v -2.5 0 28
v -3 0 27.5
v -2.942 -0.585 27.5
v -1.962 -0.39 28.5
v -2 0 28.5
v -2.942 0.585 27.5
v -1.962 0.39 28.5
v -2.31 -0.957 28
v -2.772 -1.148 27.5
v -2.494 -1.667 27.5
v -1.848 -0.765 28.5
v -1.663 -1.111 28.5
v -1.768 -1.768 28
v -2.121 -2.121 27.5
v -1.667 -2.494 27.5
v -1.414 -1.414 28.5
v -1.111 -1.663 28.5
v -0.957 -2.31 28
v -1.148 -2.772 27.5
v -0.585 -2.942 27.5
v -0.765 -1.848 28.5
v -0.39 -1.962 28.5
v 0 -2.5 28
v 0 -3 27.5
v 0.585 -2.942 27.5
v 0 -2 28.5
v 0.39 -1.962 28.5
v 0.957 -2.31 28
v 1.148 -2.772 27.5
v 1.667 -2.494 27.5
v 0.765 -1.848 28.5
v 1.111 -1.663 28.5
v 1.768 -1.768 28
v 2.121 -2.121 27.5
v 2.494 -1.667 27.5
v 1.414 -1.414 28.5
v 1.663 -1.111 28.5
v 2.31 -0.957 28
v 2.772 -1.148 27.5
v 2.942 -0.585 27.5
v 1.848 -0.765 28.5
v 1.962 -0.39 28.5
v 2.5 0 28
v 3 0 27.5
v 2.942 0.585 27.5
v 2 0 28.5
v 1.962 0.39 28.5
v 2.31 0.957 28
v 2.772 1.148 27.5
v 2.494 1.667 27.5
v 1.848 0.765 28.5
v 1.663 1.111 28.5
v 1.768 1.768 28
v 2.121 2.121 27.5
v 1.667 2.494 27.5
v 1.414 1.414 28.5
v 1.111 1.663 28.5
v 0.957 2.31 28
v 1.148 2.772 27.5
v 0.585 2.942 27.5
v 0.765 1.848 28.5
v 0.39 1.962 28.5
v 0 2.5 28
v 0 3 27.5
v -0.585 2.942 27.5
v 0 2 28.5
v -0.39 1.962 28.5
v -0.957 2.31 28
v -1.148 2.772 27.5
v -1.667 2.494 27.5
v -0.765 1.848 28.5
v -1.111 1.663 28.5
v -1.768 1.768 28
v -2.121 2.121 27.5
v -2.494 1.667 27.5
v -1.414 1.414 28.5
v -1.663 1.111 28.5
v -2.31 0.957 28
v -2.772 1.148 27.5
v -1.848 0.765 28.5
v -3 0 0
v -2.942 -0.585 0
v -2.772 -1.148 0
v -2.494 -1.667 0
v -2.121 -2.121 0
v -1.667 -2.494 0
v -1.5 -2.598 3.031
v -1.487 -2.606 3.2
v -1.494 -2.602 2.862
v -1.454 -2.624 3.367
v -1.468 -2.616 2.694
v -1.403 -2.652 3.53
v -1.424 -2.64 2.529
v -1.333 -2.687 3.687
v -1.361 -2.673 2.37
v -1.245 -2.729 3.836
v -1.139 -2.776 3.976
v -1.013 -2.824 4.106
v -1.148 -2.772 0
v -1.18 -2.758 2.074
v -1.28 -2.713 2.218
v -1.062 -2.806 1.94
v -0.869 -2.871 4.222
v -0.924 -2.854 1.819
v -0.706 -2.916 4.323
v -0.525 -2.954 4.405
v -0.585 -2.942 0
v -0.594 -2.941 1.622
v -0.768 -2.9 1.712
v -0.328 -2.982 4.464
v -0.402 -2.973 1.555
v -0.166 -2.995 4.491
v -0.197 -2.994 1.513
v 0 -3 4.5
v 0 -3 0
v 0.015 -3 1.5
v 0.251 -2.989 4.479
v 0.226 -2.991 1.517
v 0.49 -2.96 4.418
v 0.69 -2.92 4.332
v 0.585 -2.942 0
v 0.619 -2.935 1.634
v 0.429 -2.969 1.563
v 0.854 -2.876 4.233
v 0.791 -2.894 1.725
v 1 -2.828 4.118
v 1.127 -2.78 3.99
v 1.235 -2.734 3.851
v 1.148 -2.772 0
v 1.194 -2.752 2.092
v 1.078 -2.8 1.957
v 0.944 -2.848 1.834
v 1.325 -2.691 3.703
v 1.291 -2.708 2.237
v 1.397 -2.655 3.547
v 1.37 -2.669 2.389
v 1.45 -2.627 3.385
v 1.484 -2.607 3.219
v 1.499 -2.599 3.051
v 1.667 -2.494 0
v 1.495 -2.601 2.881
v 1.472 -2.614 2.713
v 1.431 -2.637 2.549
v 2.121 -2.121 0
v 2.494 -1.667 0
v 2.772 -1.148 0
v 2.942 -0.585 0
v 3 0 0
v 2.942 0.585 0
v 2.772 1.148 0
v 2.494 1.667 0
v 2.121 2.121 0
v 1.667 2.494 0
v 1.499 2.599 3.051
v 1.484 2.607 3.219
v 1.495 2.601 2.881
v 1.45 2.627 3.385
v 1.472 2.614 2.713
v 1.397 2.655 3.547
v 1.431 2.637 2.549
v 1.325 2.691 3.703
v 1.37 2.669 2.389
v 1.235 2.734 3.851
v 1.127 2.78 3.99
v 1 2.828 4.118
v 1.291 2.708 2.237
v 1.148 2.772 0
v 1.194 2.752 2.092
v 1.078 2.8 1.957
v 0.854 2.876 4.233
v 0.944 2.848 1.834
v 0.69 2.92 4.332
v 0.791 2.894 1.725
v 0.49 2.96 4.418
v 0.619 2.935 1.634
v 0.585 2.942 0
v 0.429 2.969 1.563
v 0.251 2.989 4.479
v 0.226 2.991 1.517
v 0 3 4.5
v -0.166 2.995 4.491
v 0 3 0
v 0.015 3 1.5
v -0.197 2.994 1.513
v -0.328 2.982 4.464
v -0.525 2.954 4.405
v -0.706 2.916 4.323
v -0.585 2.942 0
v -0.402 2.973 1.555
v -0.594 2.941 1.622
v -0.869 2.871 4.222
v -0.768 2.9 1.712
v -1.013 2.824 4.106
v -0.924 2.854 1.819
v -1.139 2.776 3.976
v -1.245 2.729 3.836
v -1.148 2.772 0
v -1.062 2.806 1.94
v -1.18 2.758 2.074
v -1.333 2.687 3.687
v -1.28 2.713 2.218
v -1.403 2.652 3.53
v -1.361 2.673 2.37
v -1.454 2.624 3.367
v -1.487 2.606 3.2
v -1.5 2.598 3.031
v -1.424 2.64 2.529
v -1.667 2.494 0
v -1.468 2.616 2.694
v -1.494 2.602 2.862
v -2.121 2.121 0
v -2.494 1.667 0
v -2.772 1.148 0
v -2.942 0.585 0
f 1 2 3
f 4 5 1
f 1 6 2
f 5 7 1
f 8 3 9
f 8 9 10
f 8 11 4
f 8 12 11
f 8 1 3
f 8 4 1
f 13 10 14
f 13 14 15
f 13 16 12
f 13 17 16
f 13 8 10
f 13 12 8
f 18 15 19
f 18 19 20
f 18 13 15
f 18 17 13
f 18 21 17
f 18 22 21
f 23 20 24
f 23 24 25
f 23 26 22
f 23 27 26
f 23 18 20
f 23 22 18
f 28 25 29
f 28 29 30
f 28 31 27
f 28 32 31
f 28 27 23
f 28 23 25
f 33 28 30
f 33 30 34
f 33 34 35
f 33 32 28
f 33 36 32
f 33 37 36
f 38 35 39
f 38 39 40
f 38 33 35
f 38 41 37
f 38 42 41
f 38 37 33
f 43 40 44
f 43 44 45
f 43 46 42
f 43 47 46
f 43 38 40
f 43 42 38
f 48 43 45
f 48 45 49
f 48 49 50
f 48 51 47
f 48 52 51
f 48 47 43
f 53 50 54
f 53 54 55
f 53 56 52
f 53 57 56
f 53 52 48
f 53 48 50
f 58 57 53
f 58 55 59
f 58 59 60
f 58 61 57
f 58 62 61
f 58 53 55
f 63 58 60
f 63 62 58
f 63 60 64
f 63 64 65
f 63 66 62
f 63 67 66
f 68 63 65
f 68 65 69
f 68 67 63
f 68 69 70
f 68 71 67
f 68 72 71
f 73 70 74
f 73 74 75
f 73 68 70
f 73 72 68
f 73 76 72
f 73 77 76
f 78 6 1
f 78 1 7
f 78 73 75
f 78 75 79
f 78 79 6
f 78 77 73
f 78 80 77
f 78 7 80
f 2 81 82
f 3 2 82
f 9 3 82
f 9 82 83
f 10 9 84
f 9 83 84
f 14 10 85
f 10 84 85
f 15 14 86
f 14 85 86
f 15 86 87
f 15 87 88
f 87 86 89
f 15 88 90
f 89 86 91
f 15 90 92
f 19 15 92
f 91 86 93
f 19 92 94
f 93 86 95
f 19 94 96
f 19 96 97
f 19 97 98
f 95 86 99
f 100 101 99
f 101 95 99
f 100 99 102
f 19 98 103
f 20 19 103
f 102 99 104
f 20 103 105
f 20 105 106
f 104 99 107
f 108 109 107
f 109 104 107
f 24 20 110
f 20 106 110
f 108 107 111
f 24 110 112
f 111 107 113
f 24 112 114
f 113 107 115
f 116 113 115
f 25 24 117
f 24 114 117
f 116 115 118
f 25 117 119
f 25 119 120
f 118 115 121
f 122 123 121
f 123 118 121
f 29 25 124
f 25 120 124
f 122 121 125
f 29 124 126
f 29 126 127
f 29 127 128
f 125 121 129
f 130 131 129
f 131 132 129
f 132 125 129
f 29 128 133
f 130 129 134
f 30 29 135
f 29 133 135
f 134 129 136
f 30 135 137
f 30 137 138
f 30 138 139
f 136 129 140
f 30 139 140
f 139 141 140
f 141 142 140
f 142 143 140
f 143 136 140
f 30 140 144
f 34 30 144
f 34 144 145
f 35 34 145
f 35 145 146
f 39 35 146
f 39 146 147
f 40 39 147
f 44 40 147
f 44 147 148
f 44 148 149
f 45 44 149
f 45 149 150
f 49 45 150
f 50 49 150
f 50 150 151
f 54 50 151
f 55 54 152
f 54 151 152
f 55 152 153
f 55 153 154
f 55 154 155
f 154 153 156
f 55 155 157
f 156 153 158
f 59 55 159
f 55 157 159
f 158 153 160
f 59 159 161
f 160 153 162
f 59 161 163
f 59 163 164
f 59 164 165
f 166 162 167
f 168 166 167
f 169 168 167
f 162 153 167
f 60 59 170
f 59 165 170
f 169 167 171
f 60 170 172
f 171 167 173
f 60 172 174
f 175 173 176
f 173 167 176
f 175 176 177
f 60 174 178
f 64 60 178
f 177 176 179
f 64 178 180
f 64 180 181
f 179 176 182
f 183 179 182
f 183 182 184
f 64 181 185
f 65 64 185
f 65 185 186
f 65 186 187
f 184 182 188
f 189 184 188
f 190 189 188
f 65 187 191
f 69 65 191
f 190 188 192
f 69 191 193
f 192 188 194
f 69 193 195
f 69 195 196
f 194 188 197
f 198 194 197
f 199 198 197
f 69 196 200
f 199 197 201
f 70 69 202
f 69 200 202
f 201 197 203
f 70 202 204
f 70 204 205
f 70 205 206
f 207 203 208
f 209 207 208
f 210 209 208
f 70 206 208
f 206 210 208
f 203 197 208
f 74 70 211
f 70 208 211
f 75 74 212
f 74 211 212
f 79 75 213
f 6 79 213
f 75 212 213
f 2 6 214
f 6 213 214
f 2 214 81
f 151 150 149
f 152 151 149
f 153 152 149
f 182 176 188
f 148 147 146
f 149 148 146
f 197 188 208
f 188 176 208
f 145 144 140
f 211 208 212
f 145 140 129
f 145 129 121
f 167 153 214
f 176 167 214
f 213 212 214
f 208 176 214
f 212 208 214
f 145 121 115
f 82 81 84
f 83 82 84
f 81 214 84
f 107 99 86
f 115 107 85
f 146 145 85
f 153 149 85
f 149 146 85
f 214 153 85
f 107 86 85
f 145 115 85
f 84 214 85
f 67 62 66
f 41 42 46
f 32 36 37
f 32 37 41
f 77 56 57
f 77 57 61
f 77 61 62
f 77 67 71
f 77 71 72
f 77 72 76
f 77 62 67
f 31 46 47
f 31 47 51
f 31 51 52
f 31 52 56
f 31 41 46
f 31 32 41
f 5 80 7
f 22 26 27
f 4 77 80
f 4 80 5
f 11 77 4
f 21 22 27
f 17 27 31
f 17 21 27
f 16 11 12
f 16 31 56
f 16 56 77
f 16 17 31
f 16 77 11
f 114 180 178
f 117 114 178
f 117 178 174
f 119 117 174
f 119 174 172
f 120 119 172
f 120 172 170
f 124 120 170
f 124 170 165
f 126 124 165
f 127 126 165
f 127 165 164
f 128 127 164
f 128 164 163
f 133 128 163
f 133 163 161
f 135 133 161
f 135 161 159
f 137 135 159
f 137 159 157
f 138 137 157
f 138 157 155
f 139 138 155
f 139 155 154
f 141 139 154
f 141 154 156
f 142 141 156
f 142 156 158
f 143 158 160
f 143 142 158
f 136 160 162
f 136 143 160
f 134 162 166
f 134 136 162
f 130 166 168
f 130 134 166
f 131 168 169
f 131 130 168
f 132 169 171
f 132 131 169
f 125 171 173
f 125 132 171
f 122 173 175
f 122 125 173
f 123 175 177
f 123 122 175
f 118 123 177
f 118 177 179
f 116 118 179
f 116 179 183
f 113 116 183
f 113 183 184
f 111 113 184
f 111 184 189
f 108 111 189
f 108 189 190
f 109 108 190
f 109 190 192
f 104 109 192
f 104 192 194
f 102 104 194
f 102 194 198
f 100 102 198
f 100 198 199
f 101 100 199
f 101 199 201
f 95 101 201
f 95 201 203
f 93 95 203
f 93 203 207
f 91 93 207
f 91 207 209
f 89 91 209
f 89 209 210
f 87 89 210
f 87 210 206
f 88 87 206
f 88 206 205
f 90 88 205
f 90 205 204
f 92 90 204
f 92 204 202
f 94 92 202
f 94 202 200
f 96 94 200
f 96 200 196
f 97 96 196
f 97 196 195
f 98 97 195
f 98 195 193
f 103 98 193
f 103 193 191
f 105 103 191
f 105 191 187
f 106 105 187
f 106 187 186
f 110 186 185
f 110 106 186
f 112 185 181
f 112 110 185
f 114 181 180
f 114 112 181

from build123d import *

# Parameters (mm, degrees)
ESQUISSE1_R                  = 3
BOSS_EXTRU_1_DEPTH           = 28.5
ENL_V_MAT_EXTRU_1_DEPTH      = 29.814059068
ENL_V_MAT_EXTRU_1_DEPTH_BACK = 29.814059068
ESQUISSE2_R                  = 1.5
CHANFREIN1_SIZE              = 1


with BuildPart() as part:
    # Esquisse1 → Boss.-Extru.1 (new body)
    with BuildSketch(Plane.XY):
        with Locations(Location((0, 0, 0), (0, 0, 180))):
            Circle(ESQUISSE1_R)
    extrude(amount=BOSS_EXTRU_1_DEPTH)

    # Esquisse2 → Enlèv. mat.-Extru.1 (cut, two sides: drawn at the far end of the back side and taken through both)
    with BuildSketch(Plane(origin=(0, 0, 0), x_dir=(1, 0, 0), z_dir=(0, 1, 0)).offset(-ENL_V_MAT_EXTRU_1_DEPTH_BACK)):
        with Locations(Location((0, -3, 0), (0, 0, 270))):
            Circle(ESQUISSE2_R)
    extrude(amount=ENL_V_MAT_EXTRU_1_DEPTH + ENL_V_MAT_EXTRU_1_DEPTH_BACK, mode=Mode.SUBTRACT)

    # Chanfrein1
    chanfrein1_edges = [part.edges().sort_by_distance(p)[0] for p in [
        (3, 0, 28.5),
    ]]
    chamfer(chanfrein1_edges, length=CHANFREIN1_SIZE)


solid = part.part
